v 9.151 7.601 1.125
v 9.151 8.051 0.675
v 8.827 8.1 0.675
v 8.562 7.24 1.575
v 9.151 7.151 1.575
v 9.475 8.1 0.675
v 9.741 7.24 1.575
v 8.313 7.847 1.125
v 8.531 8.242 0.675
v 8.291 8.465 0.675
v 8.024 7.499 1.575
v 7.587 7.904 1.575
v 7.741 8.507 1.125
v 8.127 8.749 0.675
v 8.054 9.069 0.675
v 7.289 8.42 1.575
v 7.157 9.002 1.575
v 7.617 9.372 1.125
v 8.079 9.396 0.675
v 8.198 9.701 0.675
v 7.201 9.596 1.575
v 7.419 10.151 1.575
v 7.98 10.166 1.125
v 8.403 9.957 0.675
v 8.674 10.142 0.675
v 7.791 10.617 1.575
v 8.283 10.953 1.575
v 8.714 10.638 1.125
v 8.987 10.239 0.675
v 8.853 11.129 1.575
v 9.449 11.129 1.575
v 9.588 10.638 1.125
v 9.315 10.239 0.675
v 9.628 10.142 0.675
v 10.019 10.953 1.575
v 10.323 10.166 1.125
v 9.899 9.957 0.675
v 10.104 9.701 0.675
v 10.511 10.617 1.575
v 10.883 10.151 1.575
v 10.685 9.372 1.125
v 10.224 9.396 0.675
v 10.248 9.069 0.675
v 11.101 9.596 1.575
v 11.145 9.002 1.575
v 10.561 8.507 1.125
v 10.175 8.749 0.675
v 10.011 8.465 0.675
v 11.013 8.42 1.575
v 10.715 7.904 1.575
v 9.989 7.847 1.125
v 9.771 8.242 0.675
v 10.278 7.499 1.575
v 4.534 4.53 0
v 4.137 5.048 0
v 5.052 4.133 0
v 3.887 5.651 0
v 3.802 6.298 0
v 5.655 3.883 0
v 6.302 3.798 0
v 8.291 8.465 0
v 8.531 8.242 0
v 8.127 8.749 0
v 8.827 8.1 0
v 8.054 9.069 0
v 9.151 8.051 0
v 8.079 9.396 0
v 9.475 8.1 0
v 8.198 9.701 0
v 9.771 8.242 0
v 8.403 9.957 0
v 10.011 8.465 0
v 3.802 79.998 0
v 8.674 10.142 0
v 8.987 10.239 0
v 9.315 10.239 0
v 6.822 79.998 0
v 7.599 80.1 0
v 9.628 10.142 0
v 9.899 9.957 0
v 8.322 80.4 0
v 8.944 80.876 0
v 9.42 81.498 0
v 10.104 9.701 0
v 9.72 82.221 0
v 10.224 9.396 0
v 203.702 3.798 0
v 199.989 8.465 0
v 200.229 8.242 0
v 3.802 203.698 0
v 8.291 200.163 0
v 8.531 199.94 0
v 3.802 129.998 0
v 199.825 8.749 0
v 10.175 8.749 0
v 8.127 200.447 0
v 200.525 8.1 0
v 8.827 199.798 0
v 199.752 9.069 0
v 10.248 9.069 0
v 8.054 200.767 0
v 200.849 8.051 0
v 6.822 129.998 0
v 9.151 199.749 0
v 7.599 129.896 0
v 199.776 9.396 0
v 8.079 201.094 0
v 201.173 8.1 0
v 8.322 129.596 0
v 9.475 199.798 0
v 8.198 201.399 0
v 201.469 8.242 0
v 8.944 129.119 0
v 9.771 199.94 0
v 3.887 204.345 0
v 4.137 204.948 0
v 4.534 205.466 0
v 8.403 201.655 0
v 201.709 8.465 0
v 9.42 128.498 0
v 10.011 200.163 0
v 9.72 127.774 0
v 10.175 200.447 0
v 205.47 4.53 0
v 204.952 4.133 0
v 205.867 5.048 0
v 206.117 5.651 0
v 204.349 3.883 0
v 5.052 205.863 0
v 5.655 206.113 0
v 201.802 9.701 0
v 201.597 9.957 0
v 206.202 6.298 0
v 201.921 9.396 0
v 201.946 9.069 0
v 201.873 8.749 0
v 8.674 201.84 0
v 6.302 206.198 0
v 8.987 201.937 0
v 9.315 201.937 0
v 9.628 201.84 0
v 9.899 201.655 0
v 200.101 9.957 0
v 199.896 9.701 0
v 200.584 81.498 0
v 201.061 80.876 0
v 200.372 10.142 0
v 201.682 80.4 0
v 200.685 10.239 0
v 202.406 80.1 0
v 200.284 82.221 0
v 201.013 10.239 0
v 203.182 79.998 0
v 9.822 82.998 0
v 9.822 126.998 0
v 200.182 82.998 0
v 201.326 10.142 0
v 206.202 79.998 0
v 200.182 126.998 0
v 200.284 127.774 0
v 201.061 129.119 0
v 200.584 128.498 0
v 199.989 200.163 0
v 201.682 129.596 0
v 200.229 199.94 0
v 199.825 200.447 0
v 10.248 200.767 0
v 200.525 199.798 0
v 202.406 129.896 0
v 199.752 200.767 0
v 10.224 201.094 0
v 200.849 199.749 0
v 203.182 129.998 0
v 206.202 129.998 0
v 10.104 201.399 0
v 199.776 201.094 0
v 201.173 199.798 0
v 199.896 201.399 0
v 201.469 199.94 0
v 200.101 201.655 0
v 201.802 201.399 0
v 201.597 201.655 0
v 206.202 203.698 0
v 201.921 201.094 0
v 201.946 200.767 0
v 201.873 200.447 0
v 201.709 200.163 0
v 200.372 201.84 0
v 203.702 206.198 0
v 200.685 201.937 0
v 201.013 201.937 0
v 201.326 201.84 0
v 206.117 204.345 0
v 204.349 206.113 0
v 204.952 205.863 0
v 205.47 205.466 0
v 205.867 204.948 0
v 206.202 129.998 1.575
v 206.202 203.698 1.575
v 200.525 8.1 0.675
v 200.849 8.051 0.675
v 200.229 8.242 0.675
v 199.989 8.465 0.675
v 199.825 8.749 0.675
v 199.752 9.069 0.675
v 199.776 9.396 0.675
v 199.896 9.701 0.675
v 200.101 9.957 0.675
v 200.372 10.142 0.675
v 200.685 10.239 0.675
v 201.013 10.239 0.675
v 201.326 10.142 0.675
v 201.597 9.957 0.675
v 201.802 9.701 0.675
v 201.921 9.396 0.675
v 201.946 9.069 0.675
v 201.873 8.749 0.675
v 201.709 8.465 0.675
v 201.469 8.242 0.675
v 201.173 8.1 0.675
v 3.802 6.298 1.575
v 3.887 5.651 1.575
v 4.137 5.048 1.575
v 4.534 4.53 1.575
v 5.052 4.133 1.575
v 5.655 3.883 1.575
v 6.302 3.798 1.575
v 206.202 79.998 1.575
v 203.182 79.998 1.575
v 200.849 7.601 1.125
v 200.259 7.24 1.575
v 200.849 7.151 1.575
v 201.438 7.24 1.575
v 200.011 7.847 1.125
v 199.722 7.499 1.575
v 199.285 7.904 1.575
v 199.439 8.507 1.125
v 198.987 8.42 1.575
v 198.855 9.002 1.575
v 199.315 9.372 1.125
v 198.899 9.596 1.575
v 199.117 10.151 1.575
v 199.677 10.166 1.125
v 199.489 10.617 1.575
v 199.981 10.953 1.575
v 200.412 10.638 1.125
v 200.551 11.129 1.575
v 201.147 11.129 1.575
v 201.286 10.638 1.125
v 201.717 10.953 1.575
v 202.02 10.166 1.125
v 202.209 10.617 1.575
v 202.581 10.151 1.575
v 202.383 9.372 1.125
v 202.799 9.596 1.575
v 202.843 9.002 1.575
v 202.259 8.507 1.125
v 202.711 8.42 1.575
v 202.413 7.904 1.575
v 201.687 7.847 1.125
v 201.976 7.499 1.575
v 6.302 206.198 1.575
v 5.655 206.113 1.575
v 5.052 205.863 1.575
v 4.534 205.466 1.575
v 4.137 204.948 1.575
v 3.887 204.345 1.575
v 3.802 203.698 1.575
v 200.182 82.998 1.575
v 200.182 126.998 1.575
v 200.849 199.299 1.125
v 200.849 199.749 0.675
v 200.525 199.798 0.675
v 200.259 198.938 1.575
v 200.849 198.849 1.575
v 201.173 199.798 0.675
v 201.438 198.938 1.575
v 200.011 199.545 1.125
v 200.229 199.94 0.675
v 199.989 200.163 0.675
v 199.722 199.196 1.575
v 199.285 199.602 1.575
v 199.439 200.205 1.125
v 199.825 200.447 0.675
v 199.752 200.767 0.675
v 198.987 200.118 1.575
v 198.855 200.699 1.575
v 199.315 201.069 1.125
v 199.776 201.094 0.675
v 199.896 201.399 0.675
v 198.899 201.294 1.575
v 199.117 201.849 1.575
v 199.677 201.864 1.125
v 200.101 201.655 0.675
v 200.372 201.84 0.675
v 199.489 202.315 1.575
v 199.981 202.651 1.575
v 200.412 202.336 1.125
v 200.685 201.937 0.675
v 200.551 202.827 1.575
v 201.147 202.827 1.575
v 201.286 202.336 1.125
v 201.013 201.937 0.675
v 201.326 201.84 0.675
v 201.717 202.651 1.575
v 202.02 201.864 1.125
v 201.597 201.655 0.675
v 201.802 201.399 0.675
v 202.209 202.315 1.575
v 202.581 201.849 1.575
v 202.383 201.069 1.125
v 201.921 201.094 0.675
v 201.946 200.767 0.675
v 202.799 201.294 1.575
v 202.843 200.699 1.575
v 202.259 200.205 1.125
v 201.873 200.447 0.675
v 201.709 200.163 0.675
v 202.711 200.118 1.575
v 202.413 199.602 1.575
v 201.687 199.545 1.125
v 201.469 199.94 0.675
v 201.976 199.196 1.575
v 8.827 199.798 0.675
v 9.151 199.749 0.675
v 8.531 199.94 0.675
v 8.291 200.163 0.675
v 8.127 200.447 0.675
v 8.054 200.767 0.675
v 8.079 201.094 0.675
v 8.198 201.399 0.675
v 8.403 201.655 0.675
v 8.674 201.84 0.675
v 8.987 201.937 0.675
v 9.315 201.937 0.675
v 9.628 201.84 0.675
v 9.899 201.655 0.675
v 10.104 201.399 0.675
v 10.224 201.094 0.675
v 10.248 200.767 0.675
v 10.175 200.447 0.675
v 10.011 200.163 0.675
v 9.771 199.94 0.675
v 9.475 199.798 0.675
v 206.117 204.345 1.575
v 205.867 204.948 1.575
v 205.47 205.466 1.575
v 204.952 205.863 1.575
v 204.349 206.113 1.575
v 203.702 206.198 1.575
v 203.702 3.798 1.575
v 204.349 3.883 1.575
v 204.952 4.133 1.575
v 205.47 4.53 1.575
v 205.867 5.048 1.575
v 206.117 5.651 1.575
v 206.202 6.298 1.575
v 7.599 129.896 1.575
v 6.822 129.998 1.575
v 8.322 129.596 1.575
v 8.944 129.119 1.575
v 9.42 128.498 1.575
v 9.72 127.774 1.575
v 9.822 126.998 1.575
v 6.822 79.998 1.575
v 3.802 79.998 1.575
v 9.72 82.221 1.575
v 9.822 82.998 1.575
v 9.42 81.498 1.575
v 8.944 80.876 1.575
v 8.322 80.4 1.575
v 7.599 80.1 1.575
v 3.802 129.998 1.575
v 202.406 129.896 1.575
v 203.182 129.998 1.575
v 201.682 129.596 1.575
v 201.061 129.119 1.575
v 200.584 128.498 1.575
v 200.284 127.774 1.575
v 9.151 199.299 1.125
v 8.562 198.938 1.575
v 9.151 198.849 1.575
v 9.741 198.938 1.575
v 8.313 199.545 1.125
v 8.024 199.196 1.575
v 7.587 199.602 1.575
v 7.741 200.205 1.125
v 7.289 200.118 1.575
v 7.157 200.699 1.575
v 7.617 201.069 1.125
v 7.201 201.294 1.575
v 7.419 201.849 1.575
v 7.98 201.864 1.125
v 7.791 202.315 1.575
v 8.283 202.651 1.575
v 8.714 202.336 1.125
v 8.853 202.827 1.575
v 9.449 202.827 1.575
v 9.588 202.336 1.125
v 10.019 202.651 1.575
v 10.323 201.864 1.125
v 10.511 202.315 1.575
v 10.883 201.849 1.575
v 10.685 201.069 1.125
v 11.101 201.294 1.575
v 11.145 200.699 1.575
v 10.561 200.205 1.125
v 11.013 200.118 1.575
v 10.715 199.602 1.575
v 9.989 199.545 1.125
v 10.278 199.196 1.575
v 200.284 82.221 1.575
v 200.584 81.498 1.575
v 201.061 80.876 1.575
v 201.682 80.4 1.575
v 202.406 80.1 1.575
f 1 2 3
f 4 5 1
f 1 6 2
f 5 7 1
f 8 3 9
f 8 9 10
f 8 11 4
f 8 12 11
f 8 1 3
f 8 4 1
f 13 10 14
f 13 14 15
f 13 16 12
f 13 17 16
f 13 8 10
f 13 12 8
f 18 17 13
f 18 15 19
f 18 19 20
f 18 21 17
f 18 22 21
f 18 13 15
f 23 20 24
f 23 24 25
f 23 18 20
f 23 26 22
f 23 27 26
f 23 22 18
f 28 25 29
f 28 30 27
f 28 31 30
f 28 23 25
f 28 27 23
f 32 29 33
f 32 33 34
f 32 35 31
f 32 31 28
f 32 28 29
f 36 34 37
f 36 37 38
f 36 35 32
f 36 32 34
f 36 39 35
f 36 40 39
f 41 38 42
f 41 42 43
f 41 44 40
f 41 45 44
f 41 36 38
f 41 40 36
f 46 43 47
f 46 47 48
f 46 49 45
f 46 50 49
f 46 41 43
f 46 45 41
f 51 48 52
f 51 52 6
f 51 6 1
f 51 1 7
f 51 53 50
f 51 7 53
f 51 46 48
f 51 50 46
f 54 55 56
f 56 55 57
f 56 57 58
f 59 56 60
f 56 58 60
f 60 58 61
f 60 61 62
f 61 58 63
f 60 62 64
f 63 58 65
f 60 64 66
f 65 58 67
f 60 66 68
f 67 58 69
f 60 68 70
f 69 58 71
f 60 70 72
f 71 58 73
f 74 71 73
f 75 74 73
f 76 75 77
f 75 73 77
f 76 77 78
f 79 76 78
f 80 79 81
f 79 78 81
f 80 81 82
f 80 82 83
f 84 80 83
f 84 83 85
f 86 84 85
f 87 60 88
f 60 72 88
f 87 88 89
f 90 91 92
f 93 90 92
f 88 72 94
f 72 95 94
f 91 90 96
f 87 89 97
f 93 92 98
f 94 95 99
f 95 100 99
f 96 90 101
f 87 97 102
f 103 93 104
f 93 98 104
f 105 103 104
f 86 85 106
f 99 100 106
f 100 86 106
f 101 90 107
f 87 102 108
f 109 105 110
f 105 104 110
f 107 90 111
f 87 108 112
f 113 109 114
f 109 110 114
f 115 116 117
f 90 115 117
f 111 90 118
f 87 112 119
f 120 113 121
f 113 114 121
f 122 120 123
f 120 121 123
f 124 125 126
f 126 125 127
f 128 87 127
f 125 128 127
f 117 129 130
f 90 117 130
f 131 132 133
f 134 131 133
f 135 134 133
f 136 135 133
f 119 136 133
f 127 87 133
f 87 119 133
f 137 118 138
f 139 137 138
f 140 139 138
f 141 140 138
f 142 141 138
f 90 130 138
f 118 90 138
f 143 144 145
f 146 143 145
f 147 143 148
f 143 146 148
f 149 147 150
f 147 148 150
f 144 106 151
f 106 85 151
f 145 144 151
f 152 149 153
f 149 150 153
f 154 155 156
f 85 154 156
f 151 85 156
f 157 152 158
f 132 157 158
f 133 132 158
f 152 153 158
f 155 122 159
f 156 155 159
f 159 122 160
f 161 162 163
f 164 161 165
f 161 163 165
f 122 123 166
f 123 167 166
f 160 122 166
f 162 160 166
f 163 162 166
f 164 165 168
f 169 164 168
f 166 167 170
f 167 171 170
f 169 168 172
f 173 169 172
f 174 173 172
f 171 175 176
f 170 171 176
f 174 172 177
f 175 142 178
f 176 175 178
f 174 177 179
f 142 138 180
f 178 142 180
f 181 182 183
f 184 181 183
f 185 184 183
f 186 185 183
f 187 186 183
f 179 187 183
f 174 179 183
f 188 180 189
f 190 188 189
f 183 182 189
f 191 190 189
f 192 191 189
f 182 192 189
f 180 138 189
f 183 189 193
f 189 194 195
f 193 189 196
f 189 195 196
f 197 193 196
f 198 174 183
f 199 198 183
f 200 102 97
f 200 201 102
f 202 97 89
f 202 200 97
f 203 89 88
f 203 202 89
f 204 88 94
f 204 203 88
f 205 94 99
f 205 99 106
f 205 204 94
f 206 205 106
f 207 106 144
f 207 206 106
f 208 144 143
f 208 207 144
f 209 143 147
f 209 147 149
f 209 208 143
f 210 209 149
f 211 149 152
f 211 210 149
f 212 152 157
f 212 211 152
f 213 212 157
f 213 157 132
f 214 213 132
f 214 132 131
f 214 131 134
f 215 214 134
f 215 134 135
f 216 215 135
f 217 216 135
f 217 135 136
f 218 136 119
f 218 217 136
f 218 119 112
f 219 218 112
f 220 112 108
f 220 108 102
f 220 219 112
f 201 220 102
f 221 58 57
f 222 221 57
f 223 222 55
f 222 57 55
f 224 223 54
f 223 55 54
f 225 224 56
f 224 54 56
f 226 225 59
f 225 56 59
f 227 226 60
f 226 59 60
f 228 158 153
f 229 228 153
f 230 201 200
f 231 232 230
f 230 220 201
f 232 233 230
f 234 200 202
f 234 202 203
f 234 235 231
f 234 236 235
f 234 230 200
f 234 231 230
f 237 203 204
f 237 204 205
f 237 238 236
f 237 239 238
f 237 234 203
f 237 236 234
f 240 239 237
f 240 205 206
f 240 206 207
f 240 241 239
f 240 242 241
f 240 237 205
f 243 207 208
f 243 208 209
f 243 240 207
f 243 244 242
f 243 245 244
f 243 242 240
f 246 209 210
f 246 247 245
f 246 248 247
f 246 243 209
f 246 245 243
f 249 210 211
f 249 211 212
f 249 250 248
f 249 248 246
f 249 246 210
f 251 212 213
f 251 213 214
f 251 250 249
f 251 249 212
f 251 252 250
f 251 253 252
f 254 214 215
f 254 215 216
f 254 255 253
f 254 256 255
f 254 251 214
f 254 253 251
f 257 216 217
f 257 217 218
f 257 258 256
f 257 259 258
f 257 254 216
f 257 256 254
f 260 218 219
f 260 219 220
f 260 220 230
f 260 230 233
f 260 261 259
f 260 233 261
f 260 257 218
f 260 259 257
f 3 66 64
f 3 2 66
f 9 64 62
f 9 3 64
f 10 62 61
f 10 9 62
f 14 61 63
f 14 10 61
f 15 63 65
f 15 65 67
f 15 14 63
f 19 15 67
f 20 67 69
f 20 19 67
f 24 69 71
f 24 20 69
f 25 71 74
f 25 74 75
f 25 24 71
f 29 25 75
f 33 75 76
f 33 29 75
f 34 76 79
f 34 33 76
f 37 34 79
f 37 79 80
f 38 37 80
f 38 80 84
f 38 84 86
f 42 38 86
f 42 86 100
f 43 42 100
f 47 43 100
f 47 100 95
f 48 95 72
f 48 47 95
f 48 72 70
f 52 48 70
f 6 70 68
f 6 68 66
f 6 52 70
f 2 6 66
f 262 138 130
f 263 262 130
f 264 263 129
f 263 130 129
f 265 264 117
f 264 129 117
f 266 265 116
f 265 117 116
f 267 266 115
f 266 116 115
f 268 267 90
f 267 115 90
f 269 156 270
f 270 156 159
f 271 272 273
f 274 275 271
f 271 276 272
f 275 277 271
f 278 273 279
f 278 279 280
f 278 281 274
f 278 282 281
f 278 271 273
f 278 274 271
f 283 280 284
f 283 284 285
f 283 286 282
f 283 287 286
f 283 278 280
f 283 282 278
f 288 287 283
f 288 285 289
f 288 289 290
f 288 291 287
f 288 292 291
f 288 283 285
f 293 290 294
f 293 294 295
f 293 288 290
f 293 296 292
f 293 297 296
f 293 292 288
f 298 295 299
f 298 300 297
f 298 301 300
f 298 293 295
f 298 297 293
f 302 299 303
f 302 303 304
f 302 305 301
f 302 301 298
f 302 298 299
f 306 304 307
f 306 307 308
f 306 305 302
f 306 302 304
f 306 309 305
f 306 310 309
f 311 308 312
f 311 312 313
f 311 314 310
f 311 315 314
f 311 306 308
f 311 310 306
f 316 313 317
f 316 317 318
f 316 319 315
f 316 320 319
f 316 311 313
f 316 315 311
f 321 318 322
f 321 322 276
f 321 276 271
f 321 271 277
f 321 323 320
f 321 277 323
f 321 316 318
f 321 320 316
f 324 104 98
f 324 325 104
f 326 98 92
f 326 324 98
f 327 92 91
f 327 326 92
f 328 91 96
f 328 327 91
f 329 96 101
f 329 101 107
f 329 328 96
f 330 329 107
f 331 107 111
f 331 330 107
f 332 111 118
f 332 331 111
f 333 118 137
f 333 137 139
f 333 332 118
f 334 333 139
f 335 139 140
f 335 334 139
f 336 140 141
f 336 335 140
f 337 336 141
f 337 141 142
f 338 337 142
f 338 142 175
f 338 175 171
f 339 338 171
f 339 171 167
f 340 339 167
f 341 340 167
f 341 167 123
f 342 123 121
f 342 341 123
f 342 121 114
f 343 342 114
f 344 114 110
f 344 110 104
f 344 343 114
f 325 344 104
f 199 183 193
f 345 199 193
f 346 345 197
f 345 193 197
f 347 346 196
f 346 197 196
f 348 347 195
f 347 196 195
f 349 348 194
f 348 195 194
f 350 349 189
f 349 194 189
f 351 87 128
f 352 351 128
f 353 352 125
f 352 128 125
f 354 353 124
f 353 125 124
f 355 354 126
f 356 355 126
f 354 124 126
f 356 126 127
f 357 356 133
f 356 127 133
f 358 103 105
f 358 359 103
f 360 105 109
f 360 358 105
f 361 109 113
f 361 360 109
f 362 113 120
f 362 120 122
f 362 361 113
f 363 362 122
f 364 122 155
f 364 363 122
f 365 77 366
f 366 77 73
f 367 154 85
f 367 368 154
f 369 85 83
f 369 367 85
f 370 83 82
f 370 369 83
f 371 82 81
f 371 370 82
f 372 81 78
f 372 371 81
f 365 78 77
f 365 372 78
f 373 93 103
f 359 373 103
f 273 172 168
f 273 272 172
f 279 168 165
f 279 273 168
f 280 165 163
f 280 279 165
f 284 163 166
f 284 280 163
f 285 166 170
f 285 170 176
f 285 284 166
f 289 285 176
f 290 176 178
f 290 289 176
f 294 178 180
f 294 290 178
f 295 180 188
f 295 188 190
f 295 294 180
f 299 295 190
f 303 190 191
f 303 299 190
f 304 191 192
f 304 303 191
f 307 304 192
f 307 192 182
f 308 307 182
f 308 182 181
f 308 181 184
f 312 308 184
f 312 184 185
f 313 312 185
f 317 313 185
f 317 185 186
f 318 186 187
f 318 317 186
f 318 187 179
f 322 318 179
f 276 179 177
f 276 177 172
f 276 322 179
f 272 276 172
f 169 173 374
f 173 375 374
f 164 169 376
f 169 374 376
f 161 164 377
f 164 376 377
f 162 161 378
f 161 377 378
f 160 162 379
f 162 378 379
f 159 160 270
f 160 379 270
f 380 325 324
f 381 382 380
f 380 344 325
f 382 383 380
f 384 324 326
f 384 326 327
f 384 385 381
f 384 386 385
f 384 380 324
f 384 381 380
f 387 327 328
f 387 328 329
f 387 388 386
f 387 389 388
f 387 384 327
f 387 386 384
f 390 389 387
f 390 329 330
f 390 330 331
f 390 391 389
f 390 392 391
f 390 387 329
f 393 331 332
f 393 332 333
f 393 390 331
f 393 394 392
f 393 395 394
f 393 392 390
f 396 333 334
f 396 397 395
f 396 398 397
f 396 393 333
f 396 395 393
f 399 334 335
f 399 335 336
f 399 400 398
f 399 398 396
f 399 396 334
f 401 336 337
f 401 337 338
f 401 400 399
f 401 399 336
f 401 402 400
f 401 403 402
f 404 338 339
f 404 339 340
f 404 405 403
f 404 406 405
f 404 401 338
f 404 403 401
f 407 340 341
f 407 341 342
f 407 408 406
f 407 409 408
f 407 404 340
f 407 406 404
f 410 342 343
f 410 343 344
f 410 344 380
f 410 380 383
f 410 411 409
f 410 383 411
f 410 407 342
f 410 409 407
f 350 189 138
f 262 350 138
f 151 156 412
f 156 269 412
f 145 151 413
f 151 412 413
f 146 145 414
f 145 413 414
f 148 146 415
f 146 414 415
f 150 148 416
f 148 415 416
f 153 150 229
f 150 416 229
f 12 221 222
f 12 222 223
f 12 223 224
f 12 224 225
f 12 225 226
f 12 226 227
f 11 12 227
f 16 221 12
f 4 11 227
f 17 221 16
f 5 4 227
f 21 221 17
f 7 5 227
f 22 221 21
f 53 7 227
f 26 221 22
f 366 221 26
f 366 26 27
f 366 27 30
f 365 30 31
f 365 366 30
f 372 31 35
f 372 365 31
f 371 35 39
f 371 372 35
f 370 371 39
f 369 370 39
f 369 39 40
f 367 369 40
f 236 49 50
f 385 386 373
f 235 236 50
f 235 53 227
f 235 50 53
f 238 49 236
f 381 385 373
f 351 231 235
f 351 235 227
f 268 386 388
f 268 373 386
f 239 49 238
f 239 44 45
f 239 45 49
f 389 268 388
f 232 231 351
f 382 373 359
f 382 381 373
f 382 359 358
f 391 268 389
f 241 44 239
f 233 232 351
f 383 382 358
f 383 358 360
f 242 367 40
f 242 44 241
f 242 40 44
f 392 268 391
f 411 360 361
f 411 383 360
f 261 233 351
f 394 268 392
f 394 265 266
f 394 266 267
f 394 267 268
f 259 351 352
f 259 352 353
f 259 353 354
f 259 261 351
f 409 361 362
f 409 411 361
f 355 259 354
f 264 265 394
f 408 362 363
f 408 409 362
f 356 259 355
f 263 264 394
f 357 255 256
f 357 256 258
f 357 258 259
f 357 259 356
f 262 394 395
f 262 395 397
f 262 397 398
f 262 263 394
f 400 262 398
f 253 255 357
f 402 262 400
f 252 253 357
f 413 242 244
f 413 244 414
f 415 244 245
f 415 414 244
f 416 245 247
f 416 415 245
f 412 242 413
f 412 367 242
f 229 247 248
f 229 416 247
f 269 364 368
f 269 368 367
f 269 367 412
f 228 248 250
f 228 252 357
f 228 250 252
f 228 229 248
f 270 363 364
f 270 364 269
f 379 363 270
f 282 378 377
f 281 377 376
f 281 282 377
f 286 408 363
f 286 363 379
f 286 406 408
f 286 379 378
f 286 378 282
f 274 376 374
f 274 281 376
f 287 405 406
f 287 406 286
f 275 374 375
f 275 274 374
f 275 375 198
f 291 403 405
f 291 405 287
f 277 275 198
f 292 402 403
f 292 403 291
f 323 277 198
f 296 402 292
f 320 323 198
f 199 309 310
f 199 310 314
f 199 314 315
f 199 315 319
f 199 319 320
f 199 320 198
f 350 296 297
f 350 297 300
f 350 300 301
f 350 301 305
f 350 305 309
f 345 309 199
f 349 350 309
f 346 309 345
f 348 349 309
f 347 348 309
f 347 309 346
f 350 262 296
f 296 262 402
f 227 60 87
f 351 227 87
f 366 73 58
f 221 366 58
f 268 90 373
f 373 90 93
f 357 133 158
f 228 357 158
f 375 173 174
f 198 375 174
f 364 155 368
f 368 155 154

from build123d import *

# Parameters (mm, degrees)
BOSS_EXTRUDE1_DEPTH                            = 1.5748
CSK_FOR_M2_FLAT_HEAD_MACHINE_SCREW1_AT_2_COUNT = 2
CSK_FOR_M2_FLAT_HEAD_MACHINE_SCREW1_AT_2_PITCH = 191.697818903
CSK_FOR_M2_FLAT_HEAD_MACHINE_SCREW1_AT_3_COUNT = 2
CSK_FOR_M2_FLAT_HEAD_MACHINE_SCREW1_AT_3_PITCH = 191.697818903
CSK_FOR_M2_FLAT_HEAD_MACHINE_SCREW1_AT_4_COUNT = 2
CSK_FOR_M2_FLAT_HEAD_MACHINE_SCREW1_AT_4_PITCH = 271.101655369
FILLET1_R                                      = 3
CUT_EXTRUDE1_START                             = -1.5748
CUT_EXTRUDE1_DEPTH                             = 1.5748


with BuildPart() as part:
    # Sketch1 → Boss-Extrude1 (new body)
    with BuildSketch(Plane.XY):
        Polygon((3.302181097, 206.697818903), (3.302181097, 129.997818903), (9.822181097, 129.997818903), (9.822181097, 79.997818903), (3.302181097, 79.997818903), (3.302181097, 3.297818903), (206.702181097, 3.297818903), (206.702181097, 79.997818903), (200.182181097, 79.997818903), (200.182181097, 129.997818903), (206.702181097, 129.997818903), (206.702181097, 206.697818903), align=None)
    extrude(amount=BOSS_EXTRUDE1_DEPTH)

    # Sketch3 → CSK for M2 Flat Head Machine Screw1 (revolve, cut)
    with BuildSketch(Plane(origin=(200.848909451, 9.151090549, 1.5748), x_dir=(0, -1, 0), z_dir=(1, 0, 0))):
        Polygon((0, 0), (0, 1.5748), (1.1, 1.5748), (1.1, 0.9), (2, 0), align=None)
    csk_for_m2_flat_head_machine_screw1 = revolve(axis=Axis((200.848909451, 9.151090549, 7.9248), (0, 0, -1)), mode=Mode.SUBTRACT)

    # CSK for M2 Flat Head Machine Screw1 at 2: CSK for M2 Flat Head Machine Screw1 ×2
    with Locations(*[(-i * CSK_FOR_M2_FLAT_HEAD_MACHINE_SCREW1_AT_2_PITCH, 0, 0) for i in range(1, CSK_FOR_M2_FLAT_HEAD_MACHINE_SCREW1_AT_2_COUNT)]):
        add(csk_for_m2_flat_head_machine_screw1, mode=Mode.SUBTRACT)

    # CSK for M2 Flat Head Machine Screw1 at 3: CSK for M2 Flat Head Machine Screw1 ×2
    with Locations(*[(0, i * CSK_FOR_M2_FLAT_HEAD_MACHINE_SCREW1_AT_3_PITCH, 0) for i in range(1, CSK_FOR_M2_FLAT_HEAD_MACHINE_SCREW1_AT_3_COUNT)]):
        add(csk_for_m2_flat_head_machine_screw1, mode=Mode.SUBTRACT)

    # CSK for M2 Flat Head Machine Screw1 at 4: CSK for M2 Flat Head Machine Screw1 ×2
    with Locations(*[Vector(-0.707106781, 0.707106781, 0) * (i * CSK_FOR_M2_FLAT_HEAD_MACHINE_SCREW1_AT_4_PITCH) for i in range(1, CSK_FOR_M2_FLAT_HEAD_MACHINE_SCREW1_AT_4_COUNT)]):
        add(csk_for_m2_flat_head_machine_screw1, mode=Mode.SUBTRACT)

    # Fillet1
    fillet1_edges = [part.edges().sort_by_distance(p)[0] for p in [
        (206.702181097, 206.697818903, 0.7874),
        (200.182181097, 129.997818903, 0.7874),
        (200.182181097, 79.997818903, 0.7874),
        (206.702181097, 3.297818903, 0.7874),
        (3.302181097, 3.297818903, 0.7874),
        (9.822181097, 79.997818903, 0.7874),
        (9.822181097, 129.997818903, 0.7874),
        (3.302181097, 206.697818903, 0.7874),
    ]]
    fillet(fillet1_edges, radius=FILLET1_R)

    # Sketch4 → Cut-Extrude1 (cut)
    with BuildSketch(Plane.XY.offset(1.5748).offset(CUT_EXTRUDE1_START)):
        with BuildLine():
            Line((6.302181097, 3.297818903), (203.702181097, 3.297818903))
            ThreePointArc((203.702181097, 3.297818903), (205.823501441, 4.176498559), (206.702181097, 6.297818903))
            Line((206.702181097, 6.297818903), (206.702181097, 203.697818903))
            ThreePointArc((206.702181097, 203.697818903), (205.823501441, 205.819139246), (203.702181097, 206.697818903))
            Line((203.702181097, 206.697818903), (6.302181097, 206.697818903))
            ThreePointArc((6.302181097, 206.697818903), (4.180860754, 205.819139246), (3.302181097, 203.697818903))
            Line((3.302181097, 203.697818903), (3.302181097, 6.297818903))
            ThreePointArc((3.302181097, 6.297818903), (4.180860754, 4.176498559), (6.302181097, 3.297818903))
        make_face()
        with BuildLine():
            Line((6.302181097, 3.797818903), (203.702181097, 3.797818903))
            ThreePointArc((203.702181097, 3.797818903), (205.46994805, 4.53005195), (206.202181097, 6.297818903))
            Line((206.202181097, 6.297818903), (206.202181097, 203.697818903))
            ThreePointArc((206.202181097, 203.697818903), (205.46994805, 205.465585856), (203.702181097, 206.197818903))
            Line((203.702181097, 206.197818903), (6.302181097, 206.197818903))
            ThreePointArc((6.302181097, 206.197818903), (4.534414144, 205.465585856), (3.802181097, 203.697818903))
            Line((3.802181097, 203.697818903), (3.802181097, 6.297818903))
            ThreePointArc((3.802181097, 6.297818903), (4.534414144, 4.53005195), (6.302181097, 3.797818903))
        make_face(mode=Mode.SUBTRACT)
    extrude(amount=CUT_EXTRUDE1_DEPTH, mode=Mode.SUBTRACT)


solid = part.part
